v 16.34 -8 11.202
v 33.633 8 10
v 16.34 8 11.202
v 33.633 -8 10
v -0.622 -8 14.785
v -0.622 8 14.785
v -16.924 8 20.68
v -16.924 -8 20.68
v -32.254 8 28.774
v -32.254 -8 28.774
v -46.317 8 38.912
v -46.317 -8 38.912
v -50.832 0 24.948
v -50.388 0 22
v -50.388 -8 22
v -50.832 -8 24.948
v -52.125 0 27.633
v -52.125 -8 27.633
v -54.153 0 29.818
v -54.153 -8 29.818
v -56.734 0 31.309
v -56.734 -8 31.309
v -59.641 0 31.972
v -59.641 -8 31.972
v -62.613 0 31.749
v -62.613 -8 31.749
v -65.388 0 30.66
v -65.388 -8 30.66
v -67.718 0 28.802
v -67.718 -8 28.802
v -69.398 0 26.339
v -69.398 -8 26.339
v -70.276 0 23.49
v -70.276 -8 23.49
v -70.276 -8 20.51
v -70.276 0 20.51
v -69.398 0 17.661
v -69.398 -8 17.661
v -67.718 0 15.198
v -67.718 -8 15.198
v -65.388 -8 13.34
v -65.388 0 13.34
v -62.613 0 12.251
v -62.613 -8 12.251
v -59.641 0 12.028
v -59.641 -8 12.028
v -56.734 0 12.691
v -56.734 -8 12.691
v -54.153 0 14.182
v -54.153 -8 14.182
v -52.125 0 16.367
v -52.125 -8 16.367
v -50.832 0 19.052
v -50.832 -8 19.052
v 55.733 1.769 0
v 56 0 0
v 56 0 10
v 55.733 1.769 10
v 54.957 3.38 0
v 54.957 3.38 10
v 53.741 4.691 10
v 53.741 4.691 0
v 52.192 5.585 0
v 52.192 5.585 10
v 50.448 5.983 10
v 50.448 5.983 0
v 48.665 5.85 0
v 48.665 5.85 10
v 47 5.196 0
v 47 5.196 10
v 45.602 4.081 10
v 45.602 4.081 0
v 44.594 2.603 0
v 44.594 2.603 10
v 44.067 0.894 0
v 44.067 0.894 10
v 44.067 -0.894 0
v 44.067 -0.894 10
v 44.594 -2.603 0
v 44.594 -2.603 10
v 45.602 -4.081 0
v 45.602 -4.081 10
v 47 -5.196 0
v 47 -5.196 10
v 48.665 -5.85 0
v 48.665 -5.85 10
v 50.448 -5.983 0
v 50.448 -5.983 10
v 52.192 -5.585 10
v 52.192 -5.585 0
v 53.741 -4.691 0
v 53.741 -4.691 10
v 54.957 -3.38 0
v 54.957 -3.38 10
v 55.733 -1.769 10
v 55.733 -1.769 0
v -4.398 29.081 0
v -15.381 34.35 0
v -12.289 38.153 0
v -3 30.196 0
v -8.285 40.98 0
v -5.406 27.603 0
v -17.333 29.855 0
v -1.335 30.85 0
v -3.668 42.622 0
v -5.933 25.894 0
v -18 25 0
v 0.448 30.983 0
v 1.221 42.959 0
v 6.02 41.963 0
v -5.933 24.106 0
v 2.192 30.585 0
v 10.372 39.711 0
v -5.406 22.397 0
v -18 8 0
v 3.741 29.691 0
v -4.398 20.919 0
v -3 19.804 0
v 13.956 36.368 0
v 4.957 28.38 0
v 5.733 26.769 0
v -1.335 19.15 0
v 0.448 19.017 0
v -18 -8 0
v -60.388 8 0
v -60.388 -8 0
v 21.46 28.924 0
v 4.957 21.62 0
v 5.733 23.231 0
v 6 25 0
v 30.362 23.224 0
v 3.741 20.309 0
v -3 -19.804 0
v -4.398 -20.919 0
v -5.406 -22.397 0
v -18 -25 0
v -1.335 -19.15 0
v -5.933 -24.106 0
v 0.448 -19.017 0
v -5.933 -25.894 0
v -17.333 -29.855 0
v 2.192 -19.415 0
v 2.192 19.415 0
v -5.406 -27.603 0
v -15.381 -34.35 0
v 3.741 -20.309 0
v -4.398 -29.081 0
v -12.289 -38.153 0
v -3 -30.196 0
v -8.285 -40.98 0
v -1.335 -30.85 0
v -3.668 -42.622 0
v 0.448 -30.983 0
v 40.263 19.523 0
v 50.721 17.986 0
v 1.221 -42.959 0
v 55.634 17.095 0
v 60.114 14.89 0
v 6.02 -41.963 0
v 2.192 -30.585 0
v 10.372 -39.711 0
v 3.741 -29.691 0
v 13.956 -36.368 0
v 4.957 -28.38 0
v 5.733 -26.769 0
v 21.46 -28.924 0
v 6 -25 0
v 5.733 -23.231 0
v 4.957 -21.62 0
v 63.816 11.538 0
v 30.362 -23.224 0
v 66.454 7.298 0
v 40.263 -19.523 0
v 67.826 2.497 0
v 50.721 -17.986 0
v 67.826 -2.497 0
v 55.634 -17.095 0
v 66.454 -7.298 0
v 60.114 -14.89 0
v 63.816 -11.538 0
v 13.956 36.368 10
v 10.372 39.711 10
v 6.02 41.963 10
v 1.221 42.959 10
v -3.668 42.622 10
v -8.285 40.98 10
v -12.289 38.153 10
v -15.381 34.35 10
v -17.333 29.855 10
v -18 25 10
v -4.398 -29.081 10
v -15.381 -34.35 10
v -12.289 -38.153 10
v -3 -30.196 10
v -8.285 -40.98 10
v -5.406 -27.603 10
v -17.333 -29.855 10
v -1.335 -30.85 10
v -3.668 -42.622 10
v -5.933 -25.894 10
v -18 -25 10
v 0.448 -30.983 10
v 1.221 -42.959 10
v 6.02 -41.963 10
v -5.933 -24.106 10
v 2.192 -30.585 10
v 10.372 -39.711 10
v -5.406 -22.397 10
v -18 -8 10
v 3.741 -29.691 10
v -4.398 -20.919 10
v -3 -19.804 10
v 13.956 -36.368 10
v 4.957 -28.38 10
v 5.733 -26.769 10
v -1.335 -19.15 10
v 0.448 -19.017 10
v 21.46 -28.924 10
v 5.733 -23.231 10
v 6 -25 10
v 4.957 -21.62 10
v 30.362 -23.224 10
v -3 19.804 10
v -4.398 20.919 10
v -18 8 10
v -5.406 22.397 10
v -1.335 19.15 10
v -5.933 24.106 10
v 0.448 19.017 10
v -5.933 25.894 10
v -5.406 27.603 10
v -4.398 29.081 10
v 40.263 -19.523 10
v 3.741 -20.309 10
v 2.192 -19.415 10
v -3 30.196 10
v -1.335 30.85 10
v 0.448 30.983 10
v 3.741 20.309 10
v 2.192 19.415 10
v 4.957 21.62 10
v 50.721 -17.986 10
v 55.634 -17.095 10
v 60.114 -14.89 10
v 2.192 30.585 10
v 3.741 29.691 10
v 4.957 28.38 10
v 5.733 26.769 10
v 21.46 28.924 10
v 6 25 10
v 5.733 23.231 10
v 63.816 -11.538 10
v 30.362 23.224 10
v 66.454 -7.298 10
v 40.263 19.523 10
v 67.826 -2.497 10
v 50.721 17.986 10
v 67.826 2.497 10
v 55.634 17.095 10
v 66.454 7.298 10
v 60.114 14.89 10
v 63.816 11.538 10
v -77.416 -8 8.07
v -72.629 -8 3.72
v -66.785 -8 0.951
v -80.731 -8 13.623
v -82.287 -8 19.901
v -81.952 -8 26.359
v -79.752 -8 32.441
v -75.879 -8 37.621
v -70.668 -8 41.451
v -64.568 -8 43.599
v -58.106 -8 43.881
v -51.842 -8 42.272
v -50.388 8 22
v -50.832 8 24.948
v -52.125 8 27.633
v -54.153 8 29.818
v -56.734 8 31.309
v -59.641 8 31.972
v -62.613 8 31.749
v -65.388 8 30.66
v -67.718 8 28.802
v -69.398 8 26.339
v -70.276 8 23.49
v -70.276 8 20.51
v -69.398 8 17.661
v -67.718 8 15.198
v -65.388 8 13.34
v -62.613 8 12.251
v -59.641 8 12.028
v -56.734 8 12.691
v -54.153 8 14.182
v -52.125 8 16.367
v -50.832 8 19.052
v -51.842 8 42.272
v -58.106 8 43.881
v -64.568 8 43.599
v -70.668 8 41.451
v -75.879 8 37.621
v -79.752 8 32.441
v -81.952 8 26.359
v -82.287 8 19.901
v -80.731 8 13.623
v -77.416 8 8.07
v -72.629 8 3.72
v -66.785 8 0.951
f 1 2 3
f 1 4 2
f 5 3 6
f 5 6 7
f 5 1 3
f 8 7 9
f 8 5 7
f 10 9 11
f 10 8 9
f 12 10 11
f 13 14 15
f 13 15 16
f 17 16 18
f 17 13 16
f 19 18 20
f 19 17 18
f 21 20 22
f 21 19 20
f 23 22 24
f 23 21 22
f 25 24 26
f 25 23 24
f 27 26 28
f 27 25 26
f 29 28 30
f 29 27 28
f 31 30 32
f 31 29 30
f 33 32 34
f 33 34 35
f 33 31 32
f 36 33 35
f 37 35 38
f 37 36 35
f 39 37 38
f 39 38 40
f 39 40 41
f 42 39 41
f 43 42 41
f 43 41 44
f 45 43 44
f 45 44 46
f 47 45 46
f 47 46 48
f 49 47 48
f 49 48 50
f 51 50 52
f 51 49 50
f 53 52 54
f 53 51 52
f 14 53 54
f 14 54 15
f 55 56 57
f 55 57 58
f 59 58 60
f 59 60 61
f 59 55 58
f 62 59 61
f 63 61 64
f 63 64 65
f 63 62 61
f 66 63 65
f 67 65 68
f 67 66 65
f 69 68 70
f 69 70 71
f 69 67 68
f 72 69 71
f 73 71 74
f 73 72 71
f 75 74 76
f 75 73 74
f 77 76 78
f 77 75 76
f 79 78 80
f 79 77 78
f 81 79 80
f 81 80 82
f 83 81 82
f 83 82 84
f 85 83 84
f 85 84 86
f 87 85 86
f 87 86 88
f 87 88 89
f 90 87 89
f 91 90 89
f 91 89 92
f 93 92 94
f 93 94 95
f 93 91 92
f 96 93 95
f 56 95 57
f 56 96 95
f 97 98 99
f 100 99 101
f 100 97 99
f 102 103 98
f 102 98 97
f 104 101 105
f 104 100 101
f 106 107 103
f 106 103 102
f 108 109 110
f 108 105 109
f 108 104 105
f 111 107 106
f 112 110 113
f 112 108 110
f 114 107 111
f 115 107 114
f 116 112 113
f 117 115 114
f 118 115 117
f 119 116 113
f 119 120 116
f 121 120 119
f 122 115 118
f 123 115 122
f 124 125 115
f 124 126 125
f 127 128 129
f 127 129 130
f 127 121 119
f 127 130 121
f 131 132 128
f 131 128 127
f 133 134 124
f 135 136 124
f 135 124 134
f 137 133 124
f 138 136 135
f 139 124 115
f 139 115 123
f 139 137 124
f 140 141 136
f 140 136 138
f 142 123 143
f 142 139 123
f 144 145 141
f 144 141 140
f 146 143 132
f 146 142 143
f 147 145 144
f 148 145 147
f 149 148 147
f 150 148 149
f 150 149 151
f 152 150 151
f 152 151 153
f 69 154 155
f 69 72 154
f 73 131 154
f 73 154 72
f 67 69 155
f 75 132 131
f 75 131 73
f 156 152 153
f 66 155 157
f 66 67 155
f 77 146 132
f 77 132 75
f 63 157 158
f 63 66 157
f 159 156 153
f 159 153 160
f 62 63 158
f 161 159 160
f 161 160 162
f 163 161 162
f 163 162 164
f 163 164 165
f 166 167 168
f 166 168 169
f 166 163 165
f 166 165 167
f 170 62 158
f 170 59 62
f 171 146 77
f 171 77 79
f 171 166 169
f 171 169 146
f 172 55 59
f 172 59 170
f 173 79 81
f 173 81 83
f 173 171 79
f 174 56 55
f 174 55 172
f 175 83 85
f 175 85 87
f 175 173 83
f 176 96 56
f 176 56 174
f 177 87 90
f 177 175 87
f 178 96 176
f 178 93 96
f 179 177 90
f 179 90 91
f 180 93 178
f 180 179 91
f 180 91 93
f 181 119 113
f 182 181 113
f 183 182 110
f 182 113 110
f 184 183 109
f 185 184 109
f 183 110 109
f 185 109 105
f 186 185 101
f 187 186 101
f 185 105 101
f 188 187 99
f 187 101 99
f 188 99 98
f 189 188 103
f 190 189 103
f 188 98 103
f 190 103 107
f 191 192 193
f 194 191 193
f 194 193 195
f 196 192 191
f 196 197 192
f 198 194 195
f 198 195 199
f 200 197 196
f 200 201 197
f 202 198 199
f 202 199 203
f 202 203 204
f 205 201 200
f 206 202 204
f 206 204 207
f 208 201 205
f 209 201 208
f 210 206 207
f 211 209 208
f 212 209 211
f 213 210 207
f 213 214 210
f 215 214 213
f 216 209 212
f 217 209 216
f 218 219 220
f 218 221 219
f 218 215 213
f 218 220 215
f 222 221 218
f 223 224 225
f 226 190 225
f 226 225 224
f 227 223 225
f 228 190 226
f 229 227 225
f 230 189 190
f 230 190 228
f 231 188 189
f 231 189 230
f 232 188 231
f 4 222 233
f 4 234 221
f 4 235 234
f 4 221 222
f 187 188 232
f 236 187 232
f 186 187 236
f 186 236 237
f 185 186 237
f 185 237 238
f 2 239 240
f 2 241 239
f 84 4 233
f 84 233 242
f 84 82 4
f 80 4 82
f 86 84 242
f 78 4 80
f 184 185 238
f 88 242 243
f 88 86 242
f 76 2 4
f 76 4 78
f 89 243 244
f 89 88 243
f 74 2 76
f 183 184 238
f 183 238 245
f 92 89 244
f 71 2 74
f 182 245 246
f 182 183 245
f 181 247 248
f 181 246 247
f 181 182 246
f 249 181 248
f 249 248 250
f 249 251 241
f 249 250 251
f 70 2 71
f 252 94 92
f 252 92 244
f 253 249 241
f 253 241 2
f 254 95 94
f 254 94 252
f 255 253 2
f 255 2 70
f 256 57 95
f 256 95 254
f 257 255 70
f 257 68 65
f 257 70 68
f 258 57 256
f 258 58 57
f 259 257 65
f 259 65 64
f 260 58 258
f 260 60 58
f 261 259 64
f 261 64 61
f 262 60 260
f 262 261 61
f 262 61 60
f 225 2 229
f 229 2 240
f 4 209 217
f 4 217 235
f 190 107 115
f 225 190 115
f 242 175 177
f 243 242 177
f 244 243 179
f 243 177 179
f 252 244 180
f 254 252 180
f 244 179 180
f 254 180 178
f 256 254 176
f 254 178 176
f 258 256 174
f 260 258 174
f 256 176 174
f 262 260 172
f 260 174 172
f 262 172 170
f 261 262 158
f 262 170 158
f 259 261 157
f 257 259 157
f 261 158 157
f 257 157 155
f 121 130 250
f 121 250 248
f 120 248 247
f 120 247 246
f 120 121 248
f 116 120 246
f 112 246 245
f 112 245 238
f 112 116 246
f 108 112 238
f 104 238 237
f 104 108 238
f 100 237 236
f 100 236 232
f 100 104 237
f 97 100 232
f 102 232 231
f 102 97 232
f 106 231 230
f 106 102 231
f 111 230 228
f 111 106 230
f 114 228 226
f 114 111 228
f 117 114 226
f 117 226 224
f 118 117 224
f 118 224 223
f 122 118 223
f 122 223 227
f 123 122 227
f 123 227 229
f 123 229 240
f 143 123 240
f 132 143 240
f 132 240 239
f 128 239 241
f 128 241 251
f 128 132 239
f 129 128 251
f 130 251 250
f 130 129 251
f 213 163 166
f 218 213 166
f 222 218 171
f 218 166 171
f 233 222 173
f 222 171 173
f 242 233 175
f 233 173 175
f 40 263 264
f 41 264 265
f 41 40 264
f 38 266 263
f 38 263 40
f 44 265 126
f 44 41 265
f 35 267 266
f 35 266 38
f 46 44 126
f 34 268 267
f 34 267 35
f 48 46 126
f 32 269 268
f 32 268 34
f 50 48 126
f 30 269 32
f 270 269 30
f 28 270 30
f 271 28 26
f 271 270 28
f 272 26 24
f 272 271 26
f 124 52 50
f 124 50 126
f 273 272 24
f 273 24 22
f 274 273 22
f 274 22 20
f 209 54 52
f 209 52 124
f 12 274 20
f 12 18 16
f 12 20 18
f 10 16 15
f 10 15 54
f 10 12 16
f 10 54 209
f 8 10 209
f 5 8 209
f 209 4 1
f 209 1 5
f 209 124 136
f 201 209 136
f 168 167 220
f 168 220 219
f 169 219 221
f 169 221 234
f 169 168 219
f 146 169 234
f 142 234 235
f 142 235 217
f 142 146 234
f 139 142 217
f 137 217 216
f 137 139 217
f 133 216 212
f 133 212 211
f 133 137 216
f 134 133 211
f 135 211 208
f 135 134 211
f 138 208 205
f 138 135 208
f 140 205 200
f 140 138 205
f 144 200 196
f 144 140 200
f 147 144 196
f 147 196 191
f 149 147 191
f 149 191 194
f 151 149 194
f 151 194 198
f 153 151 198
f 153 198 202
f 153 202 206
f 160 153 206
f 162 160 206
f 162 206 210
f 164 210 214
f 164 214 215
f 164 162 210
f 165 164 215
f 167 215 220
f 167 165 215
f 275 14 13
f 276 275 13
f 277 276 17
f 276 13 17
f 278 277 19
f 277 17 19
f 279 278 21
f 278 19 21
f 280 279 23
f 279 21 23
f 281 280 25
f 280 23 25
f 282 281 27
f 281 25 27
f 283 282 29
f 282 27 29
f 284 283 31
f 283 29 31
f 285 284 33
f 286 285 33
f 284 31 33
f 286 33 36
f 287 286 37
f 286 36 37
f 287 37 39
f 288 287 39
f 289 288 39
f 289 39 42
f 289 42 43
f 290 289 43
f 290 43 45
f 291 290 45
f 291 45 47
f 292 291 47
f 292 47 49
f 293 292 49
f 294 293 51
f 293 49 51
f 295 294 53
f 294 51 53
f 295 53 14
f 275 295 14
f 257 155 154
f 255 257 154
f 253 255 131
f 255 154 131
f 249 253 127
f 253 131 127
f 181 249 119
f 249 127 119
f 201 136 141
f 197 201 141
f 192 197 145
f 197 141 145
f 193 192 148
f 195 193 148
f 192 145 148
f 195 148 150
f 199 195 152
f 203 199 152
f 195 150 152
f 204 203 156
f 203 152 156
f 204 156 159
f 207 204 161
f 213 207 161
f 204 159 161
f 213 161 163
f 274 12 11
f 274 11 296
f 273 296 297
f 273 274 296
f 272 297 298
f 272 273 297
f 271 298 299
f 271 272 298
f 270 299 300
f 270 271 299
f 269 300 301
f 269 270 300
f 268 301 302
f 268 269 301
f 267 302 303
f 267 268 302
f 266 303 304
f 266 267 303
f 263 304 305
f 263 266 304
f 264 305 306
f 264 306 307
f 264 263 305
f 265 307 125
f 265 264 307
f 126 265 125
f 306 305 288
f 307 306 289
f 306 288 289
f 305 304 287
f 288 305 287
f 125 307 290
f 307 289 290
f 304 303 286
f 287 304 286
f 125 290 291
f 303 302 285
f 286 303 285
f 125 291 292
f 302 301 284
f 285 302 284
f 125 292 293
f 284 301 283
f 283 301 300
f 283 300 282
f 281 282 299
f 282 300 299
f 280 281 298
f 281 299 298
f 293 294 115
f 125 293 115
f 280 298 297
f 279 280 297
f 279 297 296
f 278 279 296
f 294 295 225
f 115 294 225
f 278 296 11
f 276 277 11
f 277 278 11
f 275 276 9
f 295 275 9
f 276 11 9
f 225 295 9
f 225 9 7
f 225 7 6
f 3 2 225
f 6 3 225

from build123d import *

# Parameters (mm, degrees)
F0_R          = 6
F1_DEPTH      = 10
F2_R          = 10
F3_DEPTH      = 8
F3_DEPTH_BACK = 8


with BuildPart() as f1:
    # F0 (on Top) → F1 (new body)
    with BuildSketch(Plane.XY):
        with BuildLine():
            ThreePointArc((50.720724, 17.985565), (30.362055, 23.224109), (13.956018, 36.367918))
            ThreePointArc((13.956018, 36.367918), (-6.032896, 41.958896), (-18, 25))
            Line((-18, 25), (-18, -25))
            ThreePointArc((-18, -25), (-6.032896, -41.958896), (13.956018, -36.367918))
            ThreePointArc((13.956018, -36.367918), (30.362055, -23.224109), (50.720724, -17.985565))
            ThreePointArc((50.720724, -17.985565), (68, 0), (50.720724, 17.985565))
        make_face()
        with Locations((0, -25)):
            Circle(F0_R, mode=Mode.SUBTRACT)
        with Locations((0, 25)):
            Circle(F0_R, mode=Mode.SUBTRACT)
        with Locations((50, 0)):
            Circle(F0_R, mode=Mode.SUBTRACT)
    extrude(amount=F1_DEPTH)

    # F2 (on Front) → F3 (join, two sides)
    with BuildSketch(Plane.XZ) as f3_sk:
        with BuildLine():
            ThreePointArc((33.633398, 10), (-8.875104, 17.449895), (-46.316665, 38.911565))
            ThreePointArc((-46.316665, 38.911565), (-81.076694, 29.481496), (-60.387876, 0))
            Line((-60.387876, 0), (33.633398, 0))
            Line((33.633398, 0), (33.633398, 10))
        make_face()
        with Locations((-60.387876, 22)):
            Circle(F2_R, mode=Mode.SUBTRACT)
    extrude(amount=F3_DEPTH)
    extrude(f3_sk.sketch, amount=-F3_DEPTH_BACK)


solid = f1.part
